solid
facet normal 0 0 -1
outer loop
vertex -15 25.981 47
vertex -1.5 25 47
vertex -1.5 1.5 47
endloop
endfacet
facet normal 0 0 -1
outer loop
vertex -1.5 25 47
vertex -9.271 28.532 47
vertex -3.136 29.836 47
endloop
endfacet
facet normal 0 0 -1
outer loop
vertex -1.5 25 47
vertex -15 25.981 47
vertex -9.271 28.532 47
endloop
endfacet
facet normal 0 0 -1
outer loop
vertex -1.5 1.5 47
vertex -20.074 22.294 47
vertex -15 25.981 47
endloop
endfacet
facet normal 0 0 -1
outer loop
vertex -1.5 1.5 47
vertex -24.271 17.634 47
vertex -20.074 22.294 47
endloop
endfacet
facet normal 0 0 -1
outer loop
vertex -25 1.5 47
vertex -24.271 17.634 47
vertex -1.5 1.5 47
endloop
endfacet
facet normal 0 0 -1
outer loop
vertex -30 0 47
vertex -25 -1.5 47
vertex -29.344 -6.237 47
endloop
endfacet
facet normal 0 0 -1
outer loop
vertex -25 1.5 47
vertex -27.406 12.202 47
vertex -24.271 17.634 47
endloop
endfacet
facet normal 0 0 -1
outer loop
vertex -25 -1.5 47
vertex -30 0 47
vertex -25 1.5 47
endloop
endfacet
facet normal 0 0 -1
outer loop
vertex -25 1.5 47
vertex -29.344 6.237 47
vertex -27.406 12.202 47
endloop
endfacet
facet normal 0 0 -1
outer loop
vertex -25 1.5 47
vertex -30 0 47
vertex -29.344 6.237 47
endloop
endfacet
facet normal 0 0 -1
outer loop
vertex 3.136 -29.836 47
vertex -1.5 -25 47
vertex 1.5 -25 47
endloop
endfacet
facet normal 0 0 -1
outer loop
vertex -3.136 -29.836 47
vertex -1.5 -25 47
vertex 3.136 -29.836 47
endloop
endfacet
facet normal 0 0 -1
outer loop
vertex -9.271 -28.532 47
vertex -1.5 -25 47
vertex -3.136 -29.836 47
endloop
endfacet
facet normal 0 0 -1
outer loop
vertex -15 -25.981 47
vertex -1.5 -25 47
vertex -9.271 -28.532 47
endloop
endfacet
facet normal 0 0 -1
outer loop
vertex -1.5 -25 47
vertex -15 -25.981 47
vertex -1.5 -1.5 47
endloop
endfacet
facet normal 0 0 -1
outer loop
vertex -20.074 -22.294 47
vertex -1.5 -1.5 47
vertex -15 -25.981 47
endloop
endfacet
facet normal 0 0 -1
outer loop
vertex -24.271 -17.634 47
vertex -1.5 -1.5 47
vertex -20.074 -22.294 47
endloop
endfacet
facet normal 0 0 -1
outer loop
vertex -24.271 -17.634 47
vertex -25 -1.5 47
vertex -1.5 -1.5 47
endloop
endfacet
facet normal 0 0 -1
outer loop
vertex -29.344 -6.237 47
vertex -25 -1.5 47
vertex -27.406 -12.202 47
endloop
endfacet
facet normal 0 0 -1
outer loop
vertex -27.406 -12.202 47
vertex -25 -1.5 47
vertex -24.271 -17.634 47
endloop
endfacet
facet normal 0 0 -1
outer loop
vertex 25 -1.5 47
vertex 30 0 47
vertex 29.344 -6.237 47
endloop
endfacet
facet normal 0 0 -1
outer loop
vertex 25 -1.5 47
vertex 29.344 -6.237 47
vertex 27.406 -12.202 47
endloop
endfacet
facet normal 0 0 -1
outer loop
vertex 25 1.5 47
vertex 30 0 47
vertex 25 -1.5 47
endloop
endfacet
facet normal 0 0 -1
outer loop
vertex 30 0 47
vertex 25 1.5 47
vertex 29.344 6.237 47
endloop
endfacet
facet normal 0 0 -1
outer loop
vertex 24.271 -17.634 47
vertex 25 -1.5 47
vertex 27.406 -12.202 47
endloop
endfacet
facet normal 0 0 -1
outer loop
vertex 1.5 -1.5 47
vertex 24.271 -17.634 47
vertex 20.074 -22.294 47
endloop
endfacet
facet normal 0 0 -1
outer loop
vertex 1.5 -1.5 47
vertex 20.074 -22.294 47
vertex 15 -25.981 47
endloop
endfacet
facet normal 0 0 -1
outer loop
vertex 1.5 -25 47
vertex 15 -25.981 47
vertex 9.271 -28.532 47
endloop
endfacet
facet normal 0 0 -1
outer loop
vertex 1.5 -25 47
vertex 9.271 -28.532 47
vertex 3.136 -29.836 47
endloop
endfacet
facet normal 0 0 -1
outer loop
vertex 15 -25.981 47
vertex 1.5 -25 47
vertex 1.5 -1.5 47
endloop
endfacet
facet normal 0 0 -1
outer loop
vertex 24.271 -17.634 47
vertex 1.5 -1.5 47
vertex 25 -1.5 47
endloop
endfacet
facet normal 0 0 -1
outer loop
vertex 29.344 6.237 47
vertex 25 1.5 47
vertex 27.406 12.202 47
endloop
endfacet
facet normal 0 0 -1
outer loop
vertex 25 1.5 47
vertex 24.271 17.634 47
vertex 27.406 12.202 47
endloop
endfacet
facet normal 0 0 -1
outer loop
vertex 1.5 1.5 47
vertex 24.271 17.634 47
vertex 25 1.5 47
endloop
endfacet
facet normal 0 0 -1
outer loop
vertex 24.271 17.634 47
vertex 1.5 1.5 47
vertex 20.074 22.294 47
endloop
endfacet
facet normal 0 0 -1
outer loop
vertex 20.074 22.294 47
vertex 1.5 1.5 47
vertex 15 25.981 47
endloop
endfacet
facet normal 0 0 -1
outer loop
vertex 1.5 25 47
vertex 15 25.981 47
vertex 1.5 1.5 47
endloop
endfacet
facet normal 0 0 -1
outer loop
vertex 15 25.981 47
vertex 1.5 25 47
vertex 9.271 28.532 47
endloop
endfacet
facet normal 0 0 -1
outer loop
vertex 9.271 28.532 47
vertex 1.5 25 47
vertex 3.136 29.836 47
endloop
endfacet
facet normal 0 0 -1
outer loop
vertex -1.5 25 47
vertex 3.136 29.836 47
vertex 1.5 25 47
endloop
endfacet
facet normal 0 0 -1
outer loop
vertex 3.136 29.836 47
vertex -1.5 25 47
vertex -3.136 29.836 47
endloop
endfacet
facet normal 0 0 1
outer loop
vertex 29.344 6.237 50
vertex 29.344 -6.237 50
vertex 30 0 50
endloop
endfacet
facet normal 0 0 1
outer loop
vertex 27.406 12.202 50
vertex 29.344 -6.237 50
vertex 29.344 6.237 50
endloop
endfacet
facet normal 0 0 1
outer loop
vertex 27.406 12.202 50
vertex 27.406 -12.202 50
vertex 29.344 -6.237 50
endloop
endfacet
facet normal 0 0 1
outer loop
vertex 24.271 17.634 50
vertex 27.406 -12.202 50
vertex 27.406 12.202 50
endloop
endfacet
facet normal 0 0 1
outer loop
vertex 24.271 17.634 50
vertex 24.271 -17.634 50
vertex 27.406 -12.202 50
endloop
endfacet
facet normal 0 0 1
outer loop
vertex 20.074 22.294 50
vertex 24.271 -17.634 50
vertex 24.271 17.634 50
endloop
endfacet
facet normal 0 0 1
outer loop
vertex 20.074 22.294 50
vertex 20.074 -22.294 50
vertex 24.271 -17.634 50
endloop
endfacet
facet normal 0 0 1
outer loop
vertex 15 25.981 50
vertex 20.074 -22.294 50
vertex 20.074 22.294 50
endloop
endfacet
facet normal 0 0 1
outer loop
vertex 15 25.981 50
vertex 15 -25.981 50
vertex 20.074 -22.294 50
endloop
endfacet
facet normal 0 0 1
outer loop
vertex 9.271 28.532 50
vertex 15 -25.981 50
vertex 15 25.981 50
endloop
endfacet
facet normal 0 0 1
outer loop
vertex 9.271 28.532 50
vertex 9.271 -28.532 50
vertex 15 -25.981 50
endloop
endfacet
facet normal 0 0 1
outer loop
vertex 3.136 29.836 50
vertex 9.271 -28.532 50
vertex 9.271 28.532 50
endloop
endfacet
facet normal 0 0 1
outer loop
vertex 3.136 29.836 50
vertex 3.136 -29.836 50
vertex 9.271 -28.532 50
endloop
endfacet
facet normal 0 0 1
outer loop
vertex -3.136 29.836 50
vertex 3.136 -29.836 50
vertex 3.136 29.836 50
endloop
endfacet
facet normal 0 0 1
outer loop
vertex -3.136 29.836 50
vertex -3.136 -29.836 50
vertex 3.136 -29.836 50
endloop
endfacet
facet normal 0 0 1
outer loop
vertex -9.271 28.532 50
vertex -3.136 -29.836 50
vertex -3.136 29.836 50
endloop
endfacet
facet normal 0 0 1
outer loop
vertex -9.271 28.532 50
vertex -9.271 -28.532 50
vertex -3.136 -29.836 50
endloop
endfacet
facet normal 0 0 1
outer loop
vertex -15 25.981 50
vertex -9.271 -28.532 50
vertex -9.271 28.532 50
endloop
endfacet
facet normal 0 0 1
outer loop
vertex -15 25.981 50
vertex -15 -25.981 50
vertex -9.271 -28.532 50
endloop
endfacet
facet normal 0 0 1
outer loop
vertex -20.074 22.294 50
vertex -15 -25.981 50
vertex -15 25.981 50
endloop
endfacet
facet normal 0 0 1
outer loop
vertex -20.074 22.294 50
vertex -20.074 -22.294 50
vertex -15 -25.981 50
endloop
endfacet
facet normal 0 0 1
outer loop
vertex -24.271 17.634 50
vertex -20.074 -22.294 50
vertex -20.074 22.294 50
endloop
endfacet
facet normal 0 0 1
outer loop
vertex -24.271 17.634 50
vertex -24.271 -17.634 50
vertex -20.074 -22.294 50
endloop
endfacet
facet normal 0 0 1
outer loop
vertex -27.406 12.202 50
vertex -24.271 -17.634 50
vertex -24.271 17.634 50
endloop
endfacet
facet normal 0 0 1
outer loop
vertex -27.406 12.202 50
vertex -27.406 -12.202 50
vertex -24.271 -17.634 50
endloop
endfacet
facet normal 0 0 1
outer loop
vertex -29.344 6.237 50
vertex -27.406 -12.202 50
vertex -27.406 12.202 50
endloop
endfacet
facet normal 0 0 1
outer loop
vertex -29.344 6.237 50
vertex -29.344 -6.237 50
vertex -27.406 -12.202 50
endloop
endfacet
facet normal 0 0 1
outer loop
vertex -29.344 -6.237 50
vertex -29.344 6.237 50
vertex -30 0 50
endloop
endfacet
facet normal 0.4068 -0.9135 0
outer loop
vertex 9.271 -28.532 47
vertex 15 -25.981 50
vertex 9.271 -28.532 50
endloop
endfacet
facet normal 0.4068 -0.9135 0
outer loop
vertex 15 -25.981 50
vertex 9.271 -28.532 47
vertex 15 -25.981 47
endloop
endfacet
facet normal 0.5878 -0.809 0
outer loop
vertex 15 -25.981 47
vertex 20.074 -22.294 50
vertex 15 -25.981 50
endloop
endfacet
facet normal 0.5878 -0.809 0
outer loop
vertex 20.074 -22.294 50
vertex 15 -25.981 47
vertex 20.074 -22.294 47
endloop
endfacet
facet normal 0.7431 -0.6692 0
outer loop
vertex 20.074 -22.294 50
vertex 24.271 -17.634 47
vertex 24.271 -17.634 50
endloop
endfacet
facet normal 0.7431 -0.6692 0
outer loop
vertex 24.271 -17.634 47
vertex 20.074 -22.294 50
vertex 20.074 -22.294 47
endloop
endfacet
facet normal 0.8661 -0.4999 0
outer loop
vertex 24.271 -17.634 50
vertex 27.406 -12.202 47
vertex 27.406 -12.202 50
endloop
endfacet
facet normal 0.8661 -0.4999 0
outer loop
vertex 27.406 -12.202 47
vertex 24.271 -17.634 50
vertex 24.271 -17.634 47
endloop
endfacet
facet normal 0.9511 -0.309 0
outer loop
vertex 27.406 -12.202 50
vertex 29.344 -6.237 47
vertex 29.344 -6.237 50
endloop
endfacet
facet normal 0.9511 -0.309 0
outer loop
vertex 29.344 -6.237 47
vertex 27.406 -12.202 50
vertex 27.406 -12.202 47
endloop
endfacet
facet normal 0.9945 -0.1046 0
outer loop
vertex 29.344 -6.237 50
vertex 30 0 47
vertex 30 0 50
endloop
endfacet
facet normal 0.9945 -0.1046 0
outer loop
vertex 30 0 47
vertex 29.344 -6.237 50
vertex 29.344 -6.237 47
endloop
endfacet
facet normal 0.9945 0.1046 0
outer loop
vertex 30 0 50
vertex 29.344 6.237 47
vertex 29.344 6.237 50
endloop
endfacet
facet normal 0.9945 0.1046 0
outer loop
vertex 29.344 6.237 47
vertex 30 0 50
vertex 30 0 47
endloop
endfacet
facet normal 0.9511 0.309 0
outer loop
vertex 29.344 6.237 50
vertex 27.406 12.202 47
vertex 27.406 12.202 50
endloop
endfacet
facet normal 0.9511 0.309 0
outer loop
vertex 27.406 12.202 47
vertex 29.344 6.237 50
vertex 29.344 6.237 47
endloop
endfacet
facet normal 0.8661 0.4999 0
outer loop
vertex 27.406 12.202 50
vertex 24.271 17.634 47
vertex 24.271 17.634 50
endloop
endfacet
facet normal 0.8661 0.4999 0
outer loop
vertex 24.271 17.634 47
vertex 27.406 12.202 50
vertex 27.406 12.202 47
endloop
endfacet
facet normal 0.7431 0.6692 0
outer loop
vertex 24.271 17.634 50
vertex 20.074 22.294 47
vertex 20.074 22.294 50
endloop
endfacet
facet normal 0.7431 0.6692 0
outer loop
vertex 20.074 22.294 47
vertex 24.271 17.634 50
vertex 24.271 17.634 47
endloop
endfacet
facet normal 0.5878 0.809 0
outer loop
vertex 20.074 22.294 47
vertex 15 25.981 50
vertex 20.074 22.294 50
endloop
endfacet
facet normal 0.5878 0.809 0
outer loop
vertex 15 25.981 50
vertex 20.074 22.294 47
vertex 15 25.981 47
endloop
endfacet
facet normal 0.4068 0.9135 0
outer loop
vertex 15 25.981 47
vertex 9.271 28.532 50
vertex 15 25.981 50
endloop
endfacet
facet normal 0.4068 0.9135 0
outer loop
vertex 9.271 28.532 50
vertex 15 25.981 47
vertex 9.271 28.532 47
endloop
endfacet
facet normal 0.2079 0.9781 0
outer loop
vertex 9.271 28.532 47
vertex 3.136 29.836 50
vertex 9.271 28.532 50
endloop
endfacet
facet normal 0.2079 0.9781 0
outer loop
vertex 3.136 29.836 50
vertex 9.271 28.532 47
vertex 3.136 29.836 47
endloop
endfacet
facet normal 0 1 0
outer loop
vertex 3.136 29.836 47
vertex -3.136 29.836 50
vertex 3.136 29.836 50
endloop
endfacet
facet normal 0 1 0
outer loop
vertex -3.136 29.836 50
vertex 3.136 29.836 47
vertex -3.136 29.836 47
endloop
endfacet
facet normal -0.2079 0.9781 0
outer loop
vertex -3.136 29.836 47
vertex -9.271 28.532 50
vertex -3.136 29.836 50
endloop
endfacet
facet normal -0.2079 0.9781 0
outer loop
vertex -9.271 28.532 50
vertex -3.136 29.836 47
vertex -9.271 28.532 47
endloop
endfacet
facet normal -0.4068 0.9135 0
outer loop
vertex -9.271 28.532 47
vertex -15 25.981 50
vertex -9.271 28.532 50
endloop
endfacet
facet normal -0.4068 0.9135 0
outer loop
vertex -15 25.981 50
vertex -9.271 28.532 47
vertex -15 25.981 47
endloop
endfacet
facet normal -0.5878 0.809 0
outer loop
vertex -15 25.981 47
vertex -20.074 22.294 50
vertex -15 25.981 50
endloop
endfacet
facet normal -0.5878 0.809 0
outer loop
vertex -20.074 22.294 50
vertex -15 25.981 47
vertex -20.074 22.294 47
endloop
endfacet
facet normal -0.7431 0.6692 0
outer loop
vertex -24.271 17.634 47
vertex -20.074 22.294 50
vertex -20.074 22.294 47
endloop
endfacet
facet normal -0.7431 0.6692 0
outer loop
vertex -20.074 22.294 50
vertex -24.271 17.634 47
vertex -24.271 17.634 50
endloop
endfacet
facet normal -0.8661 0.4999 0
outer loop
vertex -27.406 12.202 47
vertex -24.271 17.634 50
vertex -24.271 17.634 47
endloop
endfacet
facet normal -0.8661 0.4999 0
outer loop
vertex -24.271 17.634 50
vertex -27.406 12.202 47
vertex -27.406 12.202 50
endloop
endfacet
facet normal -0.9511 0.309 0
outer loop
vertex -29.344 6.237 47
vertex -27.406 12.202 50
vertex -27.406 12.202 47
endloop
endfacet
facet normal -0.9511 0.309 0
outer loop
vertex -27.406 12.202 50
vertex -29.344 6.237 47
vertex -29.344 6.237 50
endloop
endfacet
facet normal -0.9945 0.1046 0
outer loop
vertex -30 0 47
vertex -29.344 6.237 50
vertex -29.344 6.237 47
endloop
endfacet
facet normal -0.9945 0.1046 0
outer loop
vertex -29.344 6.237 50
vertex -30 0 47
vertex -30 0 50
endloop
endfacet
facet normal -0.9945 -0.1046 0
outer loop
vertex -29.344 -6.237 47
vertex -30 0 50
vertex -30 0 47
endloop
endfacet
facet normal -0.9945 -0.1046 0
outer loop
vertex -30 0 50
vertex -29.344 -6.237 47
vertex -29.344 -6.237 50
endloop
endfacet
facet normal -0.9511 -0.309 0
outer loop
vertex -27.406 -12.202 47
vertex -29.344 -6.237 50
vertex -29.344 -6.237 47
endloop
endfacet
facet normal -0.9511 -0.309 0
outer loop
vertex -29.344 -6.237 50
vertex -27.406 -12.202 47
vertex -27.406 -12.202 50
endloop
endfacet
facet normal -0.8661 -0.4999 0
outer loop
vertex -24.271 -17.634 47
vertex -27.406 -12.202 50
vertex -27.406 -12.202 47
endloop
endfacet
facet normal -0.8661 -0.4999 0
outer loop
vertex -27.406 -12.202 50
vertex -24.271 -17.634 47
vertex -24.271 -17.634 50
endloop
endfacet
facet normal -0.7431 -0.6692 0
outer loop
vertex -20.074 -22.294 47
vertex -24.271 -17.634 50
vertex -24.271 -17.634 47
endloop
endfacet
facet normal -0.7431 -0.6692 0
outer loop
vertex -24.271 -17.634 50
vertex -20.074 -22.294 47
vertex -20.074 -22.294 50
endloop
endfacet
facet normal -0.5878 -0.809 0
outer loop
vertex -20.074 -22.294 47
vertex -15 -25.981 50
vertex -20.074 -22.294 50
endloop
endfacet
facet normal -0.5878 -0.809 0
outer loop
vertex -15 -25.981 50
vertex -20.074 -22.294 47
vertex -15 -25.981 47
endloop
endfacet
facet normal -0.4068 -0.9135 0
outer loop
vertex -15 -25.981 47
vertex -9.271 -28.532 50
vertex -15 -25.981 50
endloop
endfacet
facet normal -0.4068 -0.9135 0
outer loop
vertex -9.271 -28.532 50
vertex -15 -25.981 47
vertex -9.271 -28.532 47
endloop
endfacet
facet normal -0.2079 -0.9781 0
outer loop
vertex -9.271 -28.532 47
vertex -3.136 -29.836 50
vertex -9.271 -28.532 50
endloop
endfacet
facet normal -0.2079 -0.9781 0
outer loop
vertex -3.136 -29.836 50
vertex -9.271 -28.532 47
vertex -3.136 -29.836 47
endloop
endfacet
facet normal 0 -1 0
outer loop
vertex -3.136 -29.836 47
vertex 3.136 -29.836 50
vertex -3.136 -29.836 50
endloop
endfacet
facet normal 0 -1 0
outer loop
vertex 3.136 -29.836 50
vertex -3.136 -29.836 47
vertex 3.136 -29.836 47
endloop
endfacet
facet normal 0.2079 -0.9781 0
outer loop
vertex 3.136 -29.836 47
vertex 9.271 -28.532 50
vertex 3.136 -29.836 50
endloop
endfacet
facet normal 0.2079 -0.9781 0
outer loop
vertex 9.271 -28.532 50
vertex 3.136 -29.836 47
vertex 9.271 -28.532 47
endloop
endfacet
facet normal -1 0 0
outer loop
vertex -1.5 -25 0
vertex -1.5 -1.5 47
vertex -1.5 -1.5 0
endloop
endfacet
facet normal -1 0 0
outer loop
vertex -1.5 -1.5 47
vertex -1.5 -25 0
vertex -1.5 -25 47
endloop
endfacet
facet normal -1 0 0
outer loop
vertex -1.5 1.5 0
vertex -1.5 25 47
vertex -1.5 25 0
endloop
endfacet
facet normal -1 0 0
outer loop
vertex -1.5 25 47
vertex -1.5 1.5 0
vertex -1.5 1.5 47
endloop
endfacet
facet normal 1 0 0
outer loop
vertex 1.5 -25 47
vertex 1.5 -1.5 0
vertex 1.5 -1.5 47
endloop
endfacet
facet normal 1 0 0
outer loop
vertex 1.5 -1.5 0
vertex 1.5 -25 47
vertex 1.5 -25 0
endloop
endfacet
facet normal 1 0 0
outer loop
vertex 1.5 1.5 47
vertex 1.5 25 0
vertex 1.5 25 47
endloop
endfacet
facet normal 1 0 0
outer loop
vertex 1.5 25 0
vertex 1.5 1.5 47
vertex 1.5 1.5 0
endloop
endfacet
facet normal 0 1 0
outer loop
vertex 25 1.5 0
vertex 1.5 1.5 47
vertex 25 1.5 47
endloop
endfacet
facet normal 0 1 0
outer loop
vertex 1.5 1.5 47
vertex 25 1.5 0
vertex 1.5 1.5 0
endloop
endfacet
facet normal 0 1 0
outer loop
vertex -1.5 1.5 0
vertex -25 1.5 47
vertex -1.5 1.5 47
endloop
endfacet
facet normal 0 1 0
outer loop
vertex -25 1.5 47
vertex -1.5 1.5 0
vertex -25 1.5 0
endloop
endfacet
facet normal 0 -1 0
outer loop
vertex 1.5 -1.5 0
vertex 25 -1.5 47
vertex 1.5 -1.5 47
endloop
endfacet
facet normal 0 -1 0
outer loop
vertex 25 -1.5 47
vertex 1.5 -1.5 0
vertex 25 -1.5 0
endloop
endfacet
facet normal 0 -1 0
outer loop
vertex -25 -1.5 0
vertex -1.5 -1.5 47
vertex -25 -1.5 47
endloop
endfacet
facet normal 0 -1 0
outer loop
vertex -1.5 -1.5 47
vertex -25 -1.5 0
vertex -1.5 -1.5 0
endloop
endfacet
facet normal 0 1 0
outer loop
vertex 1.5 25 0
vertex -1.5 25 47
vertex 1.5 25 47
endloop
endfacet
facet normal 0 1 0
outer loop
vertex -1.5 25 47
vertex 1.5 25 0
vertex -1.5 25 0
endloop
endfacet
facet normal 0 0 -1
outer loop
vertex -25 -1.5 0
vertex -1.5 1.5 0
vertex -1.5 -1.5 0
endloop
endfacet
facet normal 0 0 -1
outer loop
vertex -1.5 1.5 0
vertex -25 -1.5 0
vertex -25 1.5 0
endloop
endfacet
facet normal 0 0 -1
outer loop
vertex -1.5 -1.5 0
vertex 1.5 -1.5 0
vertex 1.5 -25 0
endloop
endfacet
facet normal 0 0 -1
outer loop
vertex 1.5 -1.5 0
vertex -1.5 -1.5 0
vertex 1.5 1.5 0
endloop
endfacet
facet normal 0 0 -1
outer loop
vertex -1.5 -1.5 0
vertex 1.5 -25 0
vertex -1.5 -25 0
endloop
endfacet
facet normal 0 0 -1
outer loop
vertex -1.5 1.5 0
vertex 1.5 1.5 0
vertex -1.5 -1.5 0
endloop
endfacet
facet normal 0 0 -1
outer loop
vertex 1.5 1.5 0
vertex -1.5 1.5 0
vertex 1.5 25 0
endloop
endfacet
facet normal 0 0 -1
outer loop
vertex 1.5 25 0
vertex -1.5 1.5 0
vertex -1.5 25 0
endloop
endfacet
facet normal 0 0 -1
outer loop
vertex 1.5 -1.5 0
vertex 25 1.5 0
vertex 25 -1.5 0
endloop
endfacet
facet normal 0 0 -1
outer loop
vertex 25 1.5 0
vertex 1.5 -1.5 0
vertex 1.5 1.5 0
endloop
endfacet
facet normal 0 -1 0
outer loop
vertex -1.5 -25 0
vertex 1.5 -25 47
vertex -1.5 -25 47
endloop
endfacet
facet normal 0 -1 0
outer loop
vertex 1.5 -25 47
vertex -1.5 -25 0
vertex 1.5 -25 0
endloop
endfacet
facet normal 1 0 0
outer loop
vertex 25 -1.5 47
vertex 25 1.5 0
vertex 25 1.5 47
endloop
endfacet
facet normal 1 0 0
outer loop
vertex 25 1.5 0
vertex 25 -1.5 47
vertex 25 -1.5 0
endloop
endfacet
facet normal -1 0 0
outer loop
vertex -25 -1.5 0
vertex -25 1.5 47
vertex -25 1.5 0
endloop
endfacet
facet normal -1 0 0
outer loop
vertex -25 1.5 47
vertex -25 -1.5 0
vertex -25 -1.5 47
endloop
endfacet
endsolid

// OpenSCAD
// file: lib.scad
// Das Modul verzahnugn() macht die form, für eine Reihe von Zähnen (true) beziehungsweise Löcher (false) für dies Zähne. Die laenge gibt an, über welche Strecke verzahnt werden soll, wobei darauf geachtet ist, dass dafor und dahinter genügend Platz bleibt. z gibt an, ob die form für den Zapfen oder für den Stollen gemacht werden soll. Und die zahnlaenge, wie  groß die Zähne werden.
// Es benutzt die Module Zapfen (Zähne) und Stollen (Löcher). Ausserdem hängt es von den Besonderen Variablen $thickness und $spiel ab.

module verzahnung(laenge, z = true,zahnlaenge=10)
{
   
    positionen=[for (k = [zahnlaenge : 2*zahnlaenge : laenge-2*zahnlaenge])k];
    if (!(len(positionen)>0)) echo("<font color='red'>verzahnungsfehler</font>");
    if (len(positionen)==1) echo("<font color='red'>reicht dir ein Zahn?</font>");

    rest=laenge-(positionen[len(positionen)-1]+zahnlaenge);
    translate([0,(rest-zahnlaenge)/2])
    {
        for (k = positionen)
        {
               translate([0,k]) 
		{ 
                if (z) zapfen(zahnlaenge);
                else stollen (zahnlaenge);
                }
         }
     }
}

//Das Modul stollen() macht die Form für ein einzelnes Loch passend zum dazugehörigen Zapfen.

module stollen(zahnlaenge=10)
{
    translate([-0.5*$spiel, 0]) square([$thickness+$spiel, zahnlaenge]);
}

//Das Modul zapfen() macht die Form für einen einzelnen Zahn, passend zum dazugehörigen Stollen.

module zapfen(zahnlaenge=10)
{
    wurzel=0.1;  
    //gibt an, wie weit sich der Zapfen mit seinem ursrpung überschneidet hierdurch wird verhindert, dass kleine rechenfehler dazu führen, dass er abgeschnitten wird.
    translate([-wurzel, 0.5*$spiel]) square([$thickness+wurzel, zahnlaenge - $spiel]);
}

 function tensor (z)
	=(
	z ? 1
	:
	!z ? 0
    : false
	);

 module steckung(laenge,z=true)
{
	
translate([laenge*tensor(z)/2,-0.5*$spiel])square([laenge/2+$spiel/2,$thickness+$spiel]);

}
//Das Modul aufbau gibt eine Animationssystematik. Die mit ihm aufgerufenen Module erscheinen in der Reihenfolge des aufrufes.
module aufbau()
{
    x=1/$children;
    for(n=[0:$children-1])if($t>=x*n)children(n);
}
// main file
include <lib.scad>;
$thickness=3;
$spiel=0;
radius=30;
tischhoehe=50;
rand=5;
zahn=5;

//platte();

module platte()
{
    difference()
    {
    circle(radius);
        translate([radius-rand,-0.5*$thickness])rotate(90)platte_y(false);
                translate([-0.5*$thickness,-radius+rand])platte_x(false);

    }
}
gesammt();
module gesammt()
{
    translate ([0,0,tischhoehe-$thickness])linear_extrude($thickness)platte();
   translate ([0.5*$thickness,-radius+rand,0])rotate(-90,[0,1,0])linear_extrude ($thickness)xbein();
        translate ([-radius+rand,0.5*$thickness,0])rotate(90,[1,0,0])linear_extrude ($thickness)ybein();

}
//xbein();
module xbein()
{
    difference()
    {
        square([tischhoehe-$thickness,2*(radius-rand)]);
       translate([0,radius-rand-0.5*$thickness]) x_y(true);
    }
         translate([tischhoehe-$thickness,0])   platte_x(true);

}
//ybein();
module ybein()
{
    difference()
    {
    square([2*(radius-rand),tischhoehe-$thickness]);
           translate([radius-rand+0.5*$thickness,0])
        rotate(90)x_y(false);
    }
     translate([2*(radius-rand),tischhoehe-$thickness])rotate(90)platte_y(true);

}

module x_y(z=true)
{
    steckung(tischhoehe-$thickness,z);
    
}
//platte_x();

module platte_x(z)
{
        for(k=[0,radius-rand]) translate([0,k])verzahnung((radius-rand),z,zahn );

}

module platte_y(z)
{
        verzahnung(2*(radius-rand),z,zahn );

}
